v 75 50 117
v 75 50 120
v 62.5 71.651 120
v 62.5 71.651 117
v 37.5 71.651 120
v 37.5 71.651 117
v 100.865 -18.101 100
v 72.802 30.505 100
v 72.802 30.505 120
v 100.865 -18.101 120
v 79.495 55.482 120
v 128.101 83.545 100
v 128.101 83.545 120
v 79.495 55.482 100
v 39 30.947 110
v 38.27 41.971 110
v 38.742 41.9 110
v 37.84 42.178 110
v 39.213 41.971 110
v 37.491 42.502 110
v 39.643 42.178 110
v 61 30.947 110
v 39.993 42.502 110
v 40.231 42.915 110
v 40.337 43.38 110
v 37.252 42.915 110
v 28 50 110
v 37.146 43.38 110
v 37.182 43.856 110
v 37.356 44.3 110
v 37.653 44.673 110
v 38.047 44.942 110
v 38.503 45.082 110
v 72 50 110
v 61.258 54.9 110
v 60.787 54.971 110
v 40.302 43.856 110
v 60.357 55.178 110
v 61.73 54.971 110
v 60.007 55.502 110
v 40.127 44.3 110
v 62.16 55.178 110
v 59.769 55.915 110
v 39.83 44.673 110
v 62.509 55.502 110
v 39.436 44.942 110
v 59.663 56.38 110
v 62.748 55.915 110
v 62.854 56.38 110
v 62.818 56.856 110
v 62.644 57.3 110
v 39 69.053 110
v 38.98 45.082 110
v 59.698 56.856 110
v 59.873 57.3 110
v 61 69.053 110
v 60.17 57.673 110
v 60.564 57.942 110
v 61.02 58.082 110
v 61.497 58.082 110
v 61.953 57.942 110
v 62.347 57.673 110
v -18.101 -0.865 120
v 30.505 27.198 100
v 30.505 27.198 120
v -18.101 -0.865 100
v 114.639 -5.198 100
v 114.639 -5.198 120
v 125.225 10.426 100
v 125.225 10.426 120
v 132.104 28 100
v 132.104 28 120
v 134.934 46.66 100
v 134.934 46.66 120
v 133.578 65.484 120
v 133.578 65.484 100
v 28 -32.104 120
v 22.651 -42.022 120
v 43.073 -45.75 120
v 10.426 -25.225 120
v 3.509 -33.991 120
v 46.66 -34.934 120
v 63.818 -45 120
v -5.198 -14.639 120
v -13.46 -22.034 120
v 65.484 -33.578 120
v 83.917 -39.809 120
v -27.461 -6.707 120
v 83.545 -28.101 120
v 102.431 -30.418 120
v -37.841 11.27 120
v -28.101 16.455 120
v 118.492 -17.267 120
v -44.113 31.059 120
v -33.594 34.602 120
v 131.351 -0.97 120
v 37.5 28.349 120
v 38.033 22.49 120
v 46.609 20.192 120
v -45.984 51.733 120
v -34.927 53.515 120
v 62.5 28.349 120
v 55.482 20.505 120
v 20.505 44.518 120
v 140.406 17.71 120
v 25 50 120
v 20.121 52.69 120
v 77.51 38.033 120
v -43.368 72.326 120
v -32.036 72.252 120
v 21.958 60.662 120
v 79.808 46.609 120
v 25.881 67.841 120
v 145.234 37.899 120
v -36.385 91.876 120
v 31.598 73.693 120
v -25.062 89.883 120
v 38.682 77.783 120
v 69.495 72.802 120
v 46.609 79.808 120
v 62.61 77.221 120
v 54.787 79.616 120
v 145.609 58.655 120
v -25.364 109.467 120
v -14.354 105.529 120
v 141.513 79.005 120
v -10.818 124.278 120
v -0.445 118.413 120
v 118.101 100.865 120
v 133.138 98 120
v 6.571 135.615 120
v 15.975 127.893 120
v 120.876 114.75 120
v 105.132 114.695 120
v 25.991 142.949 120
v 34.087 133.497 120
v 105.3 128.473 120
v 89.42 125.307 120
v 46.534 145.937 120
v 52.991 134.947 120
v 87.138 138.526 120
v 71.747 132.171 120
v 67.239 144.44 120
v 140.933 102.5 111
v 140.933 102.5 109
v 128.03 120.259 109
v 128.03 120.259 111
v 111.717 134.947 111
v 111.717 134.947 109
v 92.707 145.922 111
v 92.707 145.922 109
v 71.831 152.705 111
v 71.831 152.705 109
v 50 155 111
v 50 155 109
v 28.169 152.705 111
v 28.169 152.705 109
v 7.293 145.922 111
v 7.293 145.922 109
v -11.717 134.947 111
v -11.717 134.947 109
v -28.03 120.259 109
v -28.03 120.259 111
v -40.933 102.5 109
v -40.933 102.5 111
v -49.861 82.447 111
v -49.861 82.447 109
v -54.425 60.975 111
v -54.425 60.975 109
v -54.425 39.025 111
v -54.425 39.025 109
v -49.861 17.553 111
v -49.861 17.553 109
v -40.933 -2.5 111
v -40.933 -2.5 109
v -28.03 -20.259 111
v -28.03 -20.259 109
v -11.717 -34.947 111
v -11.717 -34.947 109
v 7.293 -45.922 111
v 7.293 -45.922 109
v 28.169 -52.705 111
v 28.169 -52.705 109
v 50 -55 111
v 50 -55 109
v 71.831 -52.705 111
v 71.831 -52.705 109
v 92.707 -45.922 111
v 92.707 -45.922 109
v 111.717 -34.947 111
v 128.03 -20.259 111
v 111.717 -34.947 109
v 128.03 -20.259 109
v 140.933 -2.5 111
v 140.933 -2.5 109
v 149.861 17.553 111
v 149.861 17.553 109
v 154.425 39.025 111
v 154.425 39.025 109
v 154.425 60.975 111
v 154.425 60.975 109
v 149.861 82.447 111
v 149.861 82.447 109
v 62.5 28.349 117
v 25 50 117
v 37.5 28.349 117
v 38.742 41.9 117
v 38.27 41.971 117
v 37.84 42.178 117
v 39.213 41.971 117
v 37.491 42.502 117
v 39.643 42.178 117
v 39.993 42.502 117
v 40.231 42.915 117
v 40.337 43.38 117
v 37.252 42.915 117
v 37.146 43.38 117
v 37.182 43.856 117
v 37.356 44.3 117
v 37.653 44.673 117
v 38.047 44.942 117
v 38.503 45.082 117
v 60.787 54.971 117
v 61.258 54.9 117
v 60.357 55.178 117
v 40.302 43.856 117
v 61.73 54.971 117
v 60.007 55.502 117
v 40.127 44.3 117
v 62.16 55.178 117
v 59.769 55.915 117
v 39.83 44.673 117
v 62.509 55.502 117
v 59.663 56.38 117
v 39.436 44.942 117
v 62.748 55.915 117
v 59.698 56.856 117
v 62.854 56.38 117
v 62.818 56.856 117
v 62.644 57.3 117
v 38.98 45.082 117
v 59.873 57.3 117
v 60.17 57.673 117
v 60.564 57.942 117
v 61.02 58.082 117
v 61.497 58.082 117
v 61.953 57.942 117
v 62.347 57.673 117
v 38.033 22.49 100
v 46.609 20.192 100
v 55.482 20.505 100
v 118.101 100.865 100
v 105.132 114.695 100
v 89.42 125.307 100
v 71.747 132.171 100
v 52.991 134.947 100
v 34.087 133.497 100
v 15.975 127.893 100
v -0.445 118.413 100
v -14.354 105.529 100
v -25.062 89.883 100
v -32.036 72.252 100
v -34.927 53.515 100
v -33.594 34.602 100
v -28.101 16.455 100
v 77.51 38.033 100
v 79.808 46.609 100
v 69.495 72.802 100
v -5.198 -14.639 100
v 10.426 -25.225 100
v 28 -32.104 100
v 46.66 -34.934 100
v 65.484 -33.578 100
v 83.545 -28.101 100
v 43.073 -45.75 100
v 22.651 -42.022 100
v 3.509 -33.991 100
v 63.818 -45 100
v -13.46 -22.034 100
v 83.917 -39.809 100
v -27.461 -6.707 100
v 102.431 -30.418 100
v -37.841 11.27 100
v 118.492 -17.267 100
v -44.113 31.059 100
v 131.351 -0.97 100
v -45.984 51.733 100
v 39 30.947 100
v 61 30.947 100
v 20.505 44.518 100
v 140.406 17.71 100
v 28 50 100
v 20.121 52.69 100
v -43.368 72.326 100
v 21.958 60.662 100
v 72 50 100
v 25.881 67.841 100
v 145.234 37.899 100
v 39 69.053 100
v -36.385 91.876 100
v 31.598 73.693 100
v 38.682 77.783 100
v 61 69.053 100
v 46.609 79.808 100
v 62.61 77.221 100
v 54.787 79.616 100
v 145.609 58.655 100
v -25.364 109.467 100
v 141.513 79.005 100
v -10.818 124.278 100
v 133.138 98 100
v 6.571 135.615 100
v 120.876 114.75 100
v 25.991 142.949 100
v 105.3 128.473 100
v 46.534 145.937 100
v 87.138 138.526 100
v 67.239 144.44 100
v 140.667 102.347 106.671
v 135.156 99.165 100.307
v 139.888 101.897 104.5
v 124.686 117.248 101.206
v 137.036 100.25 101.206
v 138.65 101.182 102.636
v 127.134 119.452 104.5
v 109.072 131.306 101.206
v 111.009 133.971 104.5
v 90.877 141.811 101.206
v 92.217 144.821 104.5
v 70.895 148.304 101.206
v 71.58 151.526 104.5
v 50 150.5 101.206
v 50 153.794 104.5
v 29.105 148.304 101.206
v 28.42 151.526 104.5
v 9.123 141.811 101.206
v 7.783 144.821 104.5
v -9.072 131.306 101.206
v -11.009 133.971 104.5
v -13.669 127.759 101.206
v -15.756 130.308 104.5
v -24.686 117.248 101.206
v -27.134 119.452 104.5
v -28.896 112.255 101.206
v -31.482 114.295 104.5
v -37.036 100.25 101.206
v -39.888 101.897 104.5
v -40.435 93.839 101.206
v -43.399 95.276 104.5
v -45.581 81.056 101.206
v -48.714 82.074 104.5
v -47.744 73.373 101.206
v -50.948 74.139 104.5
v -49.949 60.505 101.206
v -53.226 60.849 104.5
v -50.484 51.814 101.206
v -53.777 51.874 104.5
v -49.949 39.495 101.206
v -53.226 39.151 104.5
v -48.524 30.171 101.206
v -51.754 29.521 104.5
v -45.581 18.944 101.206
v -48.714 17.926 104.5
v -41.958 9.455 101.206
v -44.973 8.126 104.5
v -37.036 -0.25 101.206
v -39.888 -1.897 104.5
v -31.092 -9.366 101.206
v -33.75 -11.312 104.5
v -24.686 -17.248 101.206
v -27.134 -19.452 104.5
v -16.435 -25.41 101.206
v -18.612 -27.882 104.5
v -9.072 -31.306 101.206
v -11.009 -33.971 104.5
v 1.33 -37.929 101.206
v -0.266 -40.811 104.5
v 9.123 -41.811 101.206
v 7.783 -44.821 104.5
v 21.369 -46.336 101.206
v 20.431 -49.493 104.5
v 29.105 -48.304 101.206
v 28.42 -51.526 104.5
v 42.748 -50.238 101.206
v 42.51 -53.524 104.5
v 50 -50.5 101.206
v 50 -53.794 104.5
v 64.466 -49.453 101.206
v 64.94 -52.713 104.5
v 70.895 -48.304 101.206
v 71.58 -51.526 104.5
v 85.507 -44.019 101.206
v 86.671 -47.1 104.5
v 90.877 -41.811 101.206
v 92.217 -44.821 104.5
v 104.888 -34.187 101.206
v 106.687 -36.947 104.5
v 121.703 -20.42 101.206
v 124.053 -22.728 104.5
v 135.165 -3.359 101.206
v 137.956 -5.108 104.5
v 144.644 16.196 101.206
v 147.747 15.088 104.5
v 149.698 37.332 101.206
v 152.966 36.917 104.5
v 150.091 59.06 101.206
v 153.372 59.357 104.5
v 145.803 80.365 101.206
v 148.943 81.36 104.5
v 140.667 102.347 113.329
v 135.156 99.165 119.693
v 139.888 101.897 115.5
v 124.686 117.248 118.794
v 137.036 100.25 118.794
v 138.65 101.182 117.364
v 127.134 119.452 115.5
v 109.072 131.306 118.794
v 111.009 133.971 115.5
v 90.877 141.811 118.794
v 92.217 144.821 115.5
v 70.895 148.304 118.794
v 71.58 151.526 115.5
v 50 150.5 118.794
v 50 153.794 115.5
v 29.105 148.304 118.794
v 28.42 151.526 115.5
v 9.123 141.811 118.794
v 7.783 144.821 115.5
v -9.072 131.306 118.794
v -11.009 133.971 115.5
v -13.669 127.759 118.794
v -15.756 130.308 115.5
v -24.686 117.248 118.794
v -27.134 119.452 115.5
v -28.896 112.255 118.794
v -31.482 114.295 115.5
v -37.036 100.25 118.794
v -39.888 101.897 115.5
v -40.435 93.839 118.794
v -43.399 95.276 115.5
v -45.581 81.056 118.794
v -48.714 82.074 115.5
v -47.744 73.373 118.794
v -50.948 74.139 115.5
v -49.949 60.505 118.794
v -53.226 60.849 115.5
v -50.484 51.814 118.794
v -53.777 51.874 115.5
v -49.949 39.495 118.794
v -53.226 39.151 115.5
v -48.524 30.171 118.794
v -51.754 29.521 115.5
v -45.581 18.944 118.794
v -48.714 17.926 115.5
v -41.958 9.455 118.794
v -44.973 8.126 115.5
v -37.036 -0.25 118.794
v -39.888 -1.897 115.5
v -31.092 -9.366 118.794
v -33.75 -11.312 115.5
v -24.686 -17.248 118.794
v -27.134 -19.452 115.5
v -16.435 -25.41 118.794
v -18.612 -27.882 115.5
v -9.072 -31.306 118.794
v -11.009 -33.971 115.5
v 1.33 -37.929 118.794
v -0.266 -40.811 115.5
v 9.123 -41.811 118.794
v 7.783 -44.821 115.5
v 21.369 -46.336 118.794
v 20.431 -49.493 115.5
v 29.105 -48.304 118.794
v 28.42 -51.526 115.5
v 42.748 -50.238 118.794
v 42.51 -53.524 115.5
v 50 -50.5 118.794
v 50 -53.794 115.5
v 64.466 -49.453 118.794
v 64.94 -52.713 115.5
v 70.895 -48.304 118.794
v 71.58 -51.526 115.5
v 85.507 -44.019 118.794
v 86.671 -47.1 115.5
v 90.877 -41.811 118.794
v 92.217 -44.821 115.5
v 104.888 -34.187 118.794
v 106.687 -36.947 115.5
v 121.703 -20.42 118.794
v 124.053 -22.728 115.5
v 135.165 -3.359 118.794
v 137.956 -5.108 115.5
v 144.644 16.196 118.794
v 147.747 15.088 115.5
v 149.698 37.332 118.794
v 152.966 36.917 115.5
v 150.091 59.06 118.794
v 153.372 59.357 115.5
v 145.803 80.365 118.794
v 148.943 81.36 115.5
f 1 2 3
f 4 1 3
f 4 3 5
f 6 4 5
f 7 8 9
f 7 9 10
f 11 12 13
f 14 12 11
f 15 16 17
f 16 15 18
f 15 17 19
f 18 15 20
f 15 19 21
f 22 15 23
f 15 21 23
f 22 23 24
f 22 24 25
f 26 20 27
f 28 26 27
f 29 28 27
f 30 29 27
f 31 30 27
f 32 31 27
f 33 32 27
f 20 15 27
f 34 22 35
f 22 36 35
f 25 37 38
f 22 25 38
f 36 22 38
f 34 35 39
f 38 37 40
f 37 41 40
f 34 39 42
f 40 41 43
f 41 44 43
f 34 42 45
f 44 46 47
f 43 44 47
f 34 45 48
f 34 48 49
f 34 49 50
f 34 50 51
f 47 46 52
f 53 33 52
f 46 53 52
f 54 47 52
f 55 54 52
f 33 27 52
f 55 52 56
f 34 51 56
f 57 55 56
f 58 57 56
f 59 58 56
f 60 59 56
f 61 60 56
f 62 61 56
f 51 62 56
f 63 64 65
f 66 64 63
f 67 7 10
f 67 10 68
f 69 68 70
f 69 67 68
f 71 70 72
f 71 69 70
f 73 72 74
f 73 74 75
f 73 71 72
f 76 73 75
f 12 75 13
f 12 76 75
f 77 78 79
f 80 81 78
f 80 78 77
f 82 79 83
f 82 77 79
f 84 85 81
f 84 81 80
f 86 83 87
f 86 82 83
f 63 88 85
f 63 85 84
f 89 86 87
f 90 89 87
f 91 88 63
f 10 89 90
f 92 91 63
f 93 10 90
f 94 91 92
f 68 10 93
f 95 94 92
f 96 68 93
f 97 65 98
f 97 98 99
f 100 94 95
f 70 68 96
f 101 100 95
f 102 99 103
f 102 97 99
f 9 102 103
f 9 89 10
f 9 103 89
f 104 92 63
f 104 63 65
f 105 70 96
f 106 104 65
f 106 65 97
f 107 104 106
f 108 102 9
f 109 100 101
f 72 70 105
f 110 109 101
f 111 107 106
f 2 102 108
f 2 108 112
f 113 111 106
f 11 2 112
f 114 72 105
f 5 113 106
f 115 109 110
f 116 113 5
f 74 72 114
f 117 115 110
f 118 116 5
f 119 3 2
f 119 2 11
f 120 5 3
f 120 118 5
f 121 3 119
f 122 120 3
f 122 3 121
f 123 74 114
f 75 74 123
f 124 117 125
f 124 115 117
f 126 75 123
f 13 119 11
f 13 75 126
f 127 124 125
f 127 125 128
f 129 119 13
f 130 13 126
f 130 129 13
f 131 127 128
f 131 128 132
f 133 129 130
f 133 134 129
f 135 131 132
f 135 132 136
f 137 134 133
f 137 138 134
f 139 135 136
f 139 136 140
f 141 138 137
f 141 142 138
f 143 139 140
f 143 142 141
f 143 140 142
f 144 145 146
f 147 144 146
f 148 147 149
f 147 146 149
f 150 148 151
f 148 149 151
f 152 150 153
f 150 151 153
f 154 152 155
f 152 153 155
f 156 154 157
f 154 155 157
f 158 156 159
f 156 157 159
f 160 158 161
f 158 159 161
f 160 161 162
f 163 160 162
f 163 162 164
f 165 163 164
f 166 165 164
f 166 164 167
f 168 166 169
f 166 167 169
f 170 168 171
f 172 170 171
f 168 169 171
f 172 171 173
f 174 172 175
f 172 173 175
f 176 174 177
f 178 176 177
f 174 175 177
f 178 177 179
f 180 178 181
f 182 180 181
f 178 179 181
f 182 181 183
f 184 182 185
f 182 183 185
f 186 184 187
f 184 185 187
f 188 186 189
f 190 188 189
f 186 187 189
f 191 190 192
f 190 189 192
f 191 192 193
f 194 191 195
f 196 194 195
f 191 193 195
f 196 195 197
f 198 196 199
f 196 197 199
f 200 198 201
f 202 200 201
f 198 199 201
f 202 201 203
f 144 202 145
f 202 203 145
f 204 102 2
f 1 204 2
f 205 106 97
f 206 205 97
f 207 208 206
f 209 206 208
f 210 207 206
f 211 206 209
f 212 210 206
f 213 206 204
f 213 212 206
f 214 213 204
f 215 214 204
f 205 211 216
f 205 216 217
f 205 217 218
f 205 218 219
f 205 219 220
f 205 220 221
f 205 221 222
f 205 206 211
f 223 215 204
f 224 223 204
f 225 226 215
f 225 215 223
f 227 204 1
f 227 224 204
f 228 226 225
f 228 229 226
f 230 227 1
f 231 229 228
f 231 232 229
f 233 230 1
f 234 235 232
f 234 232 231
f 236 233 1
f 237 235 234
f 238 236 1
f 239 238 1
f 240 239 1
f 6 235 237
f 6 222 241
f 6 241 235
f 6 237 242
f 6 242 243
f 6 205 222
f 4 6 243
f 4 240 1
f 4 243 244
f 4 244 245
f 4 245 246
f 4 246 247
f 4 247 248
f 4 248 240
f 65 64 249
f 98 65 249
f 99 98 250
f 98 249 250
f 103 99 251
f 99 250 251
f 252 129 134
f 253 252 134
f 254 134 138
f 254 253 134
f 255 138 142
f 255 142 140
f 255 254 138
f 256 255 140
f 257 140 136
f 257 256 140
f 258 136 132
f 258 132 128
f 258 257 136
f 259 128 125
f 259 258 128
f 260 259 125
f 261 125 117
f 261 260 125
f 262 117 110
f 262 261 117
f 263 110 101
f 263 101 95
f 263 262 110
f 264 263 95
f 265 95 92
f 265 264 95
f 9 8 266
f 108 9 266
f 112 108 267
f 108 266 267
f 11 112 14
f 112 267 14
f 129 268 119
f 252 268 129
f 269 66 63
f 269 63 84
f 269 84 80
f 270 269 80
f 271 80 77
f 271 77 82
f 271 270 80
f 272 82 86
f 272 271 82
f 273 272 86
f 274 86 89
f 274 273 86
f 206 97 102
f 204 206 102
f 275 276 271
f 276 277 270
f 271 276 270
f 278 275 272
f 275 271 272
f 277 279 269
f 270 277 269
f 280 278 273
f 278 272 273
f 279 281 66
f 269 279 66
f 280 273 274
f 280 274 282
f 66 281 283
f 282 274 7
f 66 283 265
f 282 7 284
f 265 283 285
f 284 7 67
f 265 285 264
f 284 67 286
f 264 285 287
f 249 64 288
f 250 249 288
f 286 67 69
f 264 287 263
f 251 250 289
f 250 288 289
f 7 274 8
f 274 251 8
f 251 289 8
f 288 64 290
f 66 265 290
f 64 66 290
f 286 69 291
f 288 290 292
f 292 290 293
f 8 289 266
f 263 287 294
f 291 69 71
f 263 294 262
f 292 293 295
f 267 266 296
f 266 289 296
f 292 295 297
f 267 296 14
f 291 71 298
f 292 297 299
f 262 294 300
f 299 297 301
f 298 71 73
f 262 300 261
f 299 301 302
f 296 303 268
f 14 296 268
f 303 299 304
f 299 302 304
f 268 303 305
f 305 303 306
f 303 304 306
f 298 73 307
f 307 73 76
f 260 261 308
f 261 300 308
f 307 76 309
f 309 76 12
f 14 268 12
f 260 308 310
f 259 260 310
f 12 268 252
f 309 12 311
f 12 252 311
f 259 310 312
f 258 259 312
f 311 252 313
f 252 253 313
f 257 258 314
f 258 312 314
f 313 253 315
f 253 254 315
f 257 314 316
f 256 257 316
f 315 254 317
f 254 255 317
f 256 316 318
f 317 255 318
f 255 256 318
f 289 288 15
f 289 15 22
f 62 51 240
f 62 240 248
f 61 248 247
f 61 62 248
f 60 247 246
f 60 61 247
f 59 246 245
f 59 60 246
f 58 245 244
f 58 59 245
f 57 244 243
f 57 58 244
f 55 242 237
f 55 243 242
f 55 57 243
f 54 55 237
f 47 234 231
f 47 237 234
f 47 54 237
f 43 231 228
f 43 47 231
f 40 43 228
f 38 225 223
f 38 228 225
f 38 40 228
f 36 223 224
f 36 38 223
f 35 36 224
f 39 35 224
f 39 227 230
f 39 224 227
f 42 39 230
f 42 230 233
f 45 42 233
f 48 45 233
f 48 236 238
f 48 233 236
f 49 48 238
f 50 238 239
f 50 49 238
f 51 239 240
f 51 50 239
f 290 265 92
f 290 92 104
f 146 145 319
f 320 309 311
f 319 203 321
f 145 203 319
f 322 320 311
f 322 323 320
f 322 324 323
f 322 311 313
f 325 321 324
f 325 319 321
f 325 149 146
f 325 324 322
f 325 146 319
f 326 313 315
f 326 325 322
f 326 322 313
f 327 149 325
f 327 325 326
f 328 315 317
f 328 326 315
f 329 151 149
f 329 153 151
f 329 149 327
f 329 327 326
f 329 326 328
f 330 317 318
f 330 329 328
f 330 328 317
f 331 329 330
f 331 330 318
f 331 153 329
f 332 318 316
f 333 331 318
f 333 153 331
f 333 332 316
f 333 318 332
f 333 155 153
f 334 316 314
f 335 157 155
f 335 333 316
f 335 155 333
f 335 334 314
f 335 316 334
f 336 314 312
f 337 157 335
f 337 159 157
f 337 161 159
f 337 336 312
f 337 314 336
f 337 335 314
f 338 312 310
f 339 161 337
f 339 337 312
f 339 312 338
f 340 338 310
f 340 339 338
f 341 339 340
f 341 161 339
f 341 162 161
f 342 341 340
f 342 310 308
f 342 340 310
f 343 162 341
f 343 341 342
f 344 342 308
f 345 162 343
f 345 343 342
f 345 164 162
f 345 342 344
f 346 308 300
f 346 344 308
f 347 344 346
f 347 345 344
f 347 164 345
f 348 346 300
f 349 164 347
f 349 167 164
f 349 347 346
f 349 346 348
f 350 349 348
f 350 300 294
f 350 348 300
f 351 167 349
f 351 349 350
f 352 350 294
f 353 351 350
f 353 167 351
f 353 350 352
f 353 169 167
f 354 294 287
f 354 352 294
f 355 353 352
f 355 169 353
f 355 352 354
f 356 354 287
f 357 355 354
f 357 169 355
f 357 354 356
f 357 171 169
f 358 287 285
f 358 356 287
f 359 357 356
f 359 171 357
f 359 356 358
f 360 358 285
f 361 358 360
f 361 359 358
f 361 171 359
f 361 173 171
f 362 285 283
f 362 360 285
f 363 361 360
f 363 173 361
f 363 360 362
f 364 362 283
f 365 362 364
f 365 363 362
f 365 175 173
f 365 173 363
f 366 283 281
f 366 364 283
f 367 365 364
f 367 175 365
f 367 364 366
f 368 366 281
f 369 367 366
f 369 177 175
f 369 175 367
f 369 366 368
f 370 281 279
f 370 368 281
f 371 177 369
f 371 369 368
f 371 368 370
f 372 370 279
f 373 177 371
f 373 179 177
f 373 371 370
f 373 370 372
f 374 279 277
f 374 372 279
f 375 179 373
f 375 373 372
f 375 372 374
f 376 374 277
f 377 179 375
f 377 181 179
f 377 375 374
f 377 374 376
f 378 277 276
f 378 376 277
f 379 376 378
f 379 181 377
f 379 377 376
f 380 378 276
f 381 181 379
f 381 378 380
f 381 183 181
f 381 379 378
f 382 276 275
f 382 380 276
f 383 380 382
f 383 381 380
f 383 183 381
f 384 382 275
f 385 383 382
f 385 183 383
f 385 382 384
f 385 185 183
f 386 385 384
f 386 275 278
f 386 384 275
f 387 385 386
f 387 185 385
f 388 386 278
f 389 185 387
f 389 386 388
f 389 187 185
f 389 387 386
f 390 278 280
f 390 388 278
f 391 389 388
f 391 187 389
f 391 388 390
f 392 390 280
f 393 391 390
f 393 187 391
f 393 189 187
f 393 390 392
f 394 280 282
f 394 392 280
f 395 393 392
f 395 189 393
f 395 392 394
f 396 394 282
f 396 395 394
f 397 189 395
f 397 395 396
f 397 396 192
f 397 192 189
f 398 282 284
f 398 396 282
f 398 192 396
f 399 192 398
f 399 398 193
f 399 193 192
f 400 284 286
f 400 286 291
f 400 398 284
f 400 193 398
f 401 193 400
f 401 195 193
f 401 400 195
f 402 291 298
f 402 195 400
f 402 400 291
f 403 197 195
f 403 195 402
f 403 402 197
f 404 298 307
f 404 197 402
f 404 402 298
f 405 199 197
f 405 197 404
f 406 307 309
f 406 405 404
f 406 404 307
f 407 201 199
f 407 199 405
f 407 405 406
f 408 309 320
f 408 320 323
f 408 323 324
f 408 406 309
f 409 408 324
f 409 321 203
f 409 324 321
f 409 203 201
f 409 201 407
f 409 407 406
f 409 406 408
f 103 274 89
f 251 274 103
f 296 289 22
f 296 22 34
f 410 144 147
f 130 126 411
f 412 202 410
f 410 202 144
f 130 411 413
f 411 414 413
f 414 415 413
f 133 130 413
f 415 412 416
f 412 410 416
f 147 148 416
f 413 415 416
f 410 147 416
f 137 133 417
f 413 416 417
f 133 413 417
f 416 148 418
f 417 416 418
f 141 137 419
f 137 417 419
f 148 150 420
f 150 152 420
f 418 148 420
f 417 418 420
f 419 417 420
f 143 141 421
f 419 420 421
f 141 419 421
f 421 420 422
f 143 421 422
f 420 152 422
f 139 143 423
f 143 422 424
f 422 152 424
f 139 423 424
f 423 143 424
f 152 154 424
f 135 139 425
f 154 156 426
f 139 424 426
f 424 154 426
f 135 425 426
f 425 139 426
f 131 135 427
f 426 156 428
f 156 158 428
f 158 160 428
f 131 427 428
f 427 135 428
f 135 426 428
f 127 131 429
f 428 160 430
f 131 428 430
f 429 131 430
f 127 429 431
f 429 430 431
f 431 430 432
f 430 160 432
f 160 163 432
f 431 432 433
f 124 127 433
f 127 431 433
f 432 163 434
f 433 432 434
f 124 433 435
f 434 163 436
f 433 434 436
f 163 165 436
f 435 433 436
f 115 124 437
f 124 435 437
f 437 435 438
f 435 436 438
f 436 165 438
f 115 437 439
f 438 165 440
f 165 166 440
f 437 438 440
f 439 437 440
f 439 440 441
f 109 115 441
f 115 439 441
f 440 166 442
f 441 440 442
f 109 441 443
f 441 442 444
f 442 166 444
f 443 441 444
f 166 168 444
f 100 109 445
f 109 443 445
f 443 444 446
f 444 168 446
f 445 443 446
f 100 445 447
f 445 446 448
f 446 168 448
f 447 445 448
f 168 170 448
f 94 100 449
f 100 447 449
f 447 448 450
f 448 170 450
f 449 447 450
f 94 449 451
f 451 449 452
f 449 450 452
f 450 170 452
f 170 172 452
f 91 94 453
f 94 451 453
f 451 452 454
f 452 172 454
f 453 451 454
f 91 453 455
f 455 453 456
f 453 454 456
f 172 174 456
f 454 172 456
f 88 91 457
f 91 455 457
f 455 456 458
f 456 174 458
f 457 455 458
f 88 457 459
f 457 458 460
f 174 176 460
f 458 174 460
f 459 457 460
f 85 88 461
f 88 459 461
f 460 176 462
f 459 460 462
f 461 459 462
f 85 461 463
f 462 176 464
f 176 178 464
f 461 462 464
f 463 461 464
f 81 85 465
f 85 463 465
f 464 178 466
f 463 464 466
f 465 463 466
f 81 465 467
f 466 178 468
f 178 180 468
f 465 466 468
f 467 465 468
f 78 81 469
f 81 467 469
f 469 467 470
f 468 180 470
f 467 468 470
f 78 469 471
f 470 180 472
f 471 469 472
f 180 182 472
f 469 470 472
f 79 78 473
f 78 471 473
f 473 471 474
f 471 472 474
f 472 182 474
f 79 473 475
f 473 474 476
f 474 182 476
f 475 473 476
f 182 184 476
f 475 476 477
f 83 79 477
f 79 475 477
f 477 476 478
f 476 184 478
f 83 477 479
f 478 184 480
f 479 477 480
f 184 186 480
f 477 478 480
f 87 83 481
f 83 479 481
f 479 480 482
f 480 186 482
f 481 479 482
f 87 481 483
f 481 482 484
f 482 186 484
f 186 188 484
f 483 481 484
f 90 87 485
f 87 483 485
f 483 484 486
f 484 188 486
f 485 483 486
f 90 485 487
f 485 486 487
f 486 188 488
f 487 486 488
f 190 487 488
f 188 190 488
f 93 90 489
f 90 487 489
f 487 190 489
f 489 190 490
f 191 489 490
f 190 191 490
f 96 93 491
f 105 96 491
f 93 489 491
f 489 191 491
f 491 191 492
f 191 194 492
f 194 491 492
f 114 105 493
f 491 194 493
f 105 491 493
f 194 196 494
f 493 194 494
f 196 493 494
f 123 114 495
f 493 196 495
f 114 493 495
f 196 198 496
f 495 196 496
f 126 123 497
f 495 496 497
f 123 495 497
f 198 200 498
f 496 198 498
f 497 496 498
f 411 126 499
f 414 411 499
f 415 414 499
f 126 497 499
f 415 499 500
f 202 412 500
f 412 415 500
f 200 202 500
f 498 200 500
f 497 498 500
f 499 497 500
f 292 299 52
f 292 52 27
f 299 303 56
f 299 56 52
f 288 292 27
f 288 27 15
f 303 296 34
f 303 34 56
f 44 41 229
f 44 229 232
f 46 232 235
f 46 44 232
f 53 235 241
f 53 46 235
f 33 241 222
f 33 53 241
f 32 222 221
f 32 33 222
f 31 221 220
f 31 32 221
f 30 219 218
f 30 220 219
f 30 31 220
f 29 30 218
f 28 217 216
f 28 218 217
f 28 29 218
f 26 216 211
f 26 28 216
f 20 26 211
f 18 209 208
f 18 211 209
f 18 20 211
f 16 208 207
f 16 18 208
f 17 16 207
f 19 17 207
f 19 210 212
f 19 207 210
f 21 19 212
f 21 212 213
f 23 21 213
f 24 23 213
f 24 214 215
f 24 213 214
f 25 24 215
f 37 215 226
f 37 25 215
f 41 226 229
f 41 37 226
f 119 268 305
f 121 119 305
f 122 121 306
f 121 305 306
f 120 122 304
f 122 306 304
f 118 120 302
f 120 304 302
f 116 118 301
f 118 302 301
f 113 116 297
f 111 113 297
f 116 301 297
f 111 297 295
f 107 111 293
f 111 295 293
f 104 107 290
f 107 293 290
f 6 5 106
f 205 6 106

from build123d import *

# Parameters (mm, degrees)
SKETCH012_R             = 105
SKETCH012_R_2           = 85
PAD006_DEPTH            = 20
PAD005_DEPTH            = 20
POCKET006_DEPTH         = 10
SKETCH013_R             = 1.6
POCKET007_DEPTH         = 20
POCKET008_DEPTH         = 3
FILLET001_R             = 9
BODY002_PLACEMENT_ANGLE = 30


with BuildPart() as part:
    # Sketch012 → Pad006 (new body)
    with BuildSketch(Plane.XY):
        Circle(SKETCH012_R)
        Circle(SKETCH012_R_2, mode=Mode.SUBTRACT)
    extrude(amount=PAD006_DEPTH)

    # Sketch014 → Pad005 (join)
    with BuildSketch(Plane.XY):
        with BuildLine():
            ThreePointArc((-28.284271, -10), (-21.213203, -21.213203), (-10, -28.284271))
            Line((-10, -100), (-10, -28.284271))
            Line((10, -100), (-10, -100))
            Line((10, -28.284271), (10, -100))
            ThreePointArc((10, -28.284271), (21.213203, -21.213203), (28.284271, -10))
            Line((100, -10), (28.284271, -10))
            Line((100, 10), (100, -10))
            Line((28.284271, 10), (100, 10))
            ThreePointArc((28.284271, 10), (0, 30), (-28.284271, 10))
            Line((-100, 10), (-28.284271, 10))
            Line((-100, -10), (-100, 10))
            Line((-28.284271, -10), (-100, -10))
        make_face()
    extrude(amount=PAD005_DEPTH)

    # Sketch011 → Pocket006 (cut)
    with BuildSketch(Plane.XY):
        Polygon((19.052559, 11), (0, 22), (-19.052559, 11), (-19.052559, -11), (0, -22), (19.052559, -11), align=None)
    extrude(amount=POCKET006_DEPTH, mode=Mode.SUBTRACT)

    # Sketch013 → Pocket007 (cut)
    with BuildSketch(Plane.XY):
        with Locations((-13, 0)):
            Circle(SKETCH013_R)
        with Locations((13, 0)):
            Circle(SKETCH013_R)
    extrude(amount=POCKET007_DEPTH, mode=Mode.SUBTRACT)

    # Sketch015 → Pocket008 (cut)
    with BuildSketch(Plane.XY.offset(20)):
        Polygon((21.650635, 12.5), (0, 25), (-21.650635, 12.5), (-21.650635, -12.5), (0, -25), (21.650635, -12.5), align=None)
    extrude(amount=-POCKET008_DEPTH, mode=Mode.SUBTRACT)

    # Fillet001
    fillet001_edges = [part.edges().sort_by_distance(p)[0] for p in [
        (-105, 0, 20),
        (-105, 0, 0),
    ]]
    fillet(fillet001_edges, radius=FILLET001_R)


with BuildPart() as part_1:
    # Body002 placement: moved
    add(part.part.moved(Location((50, 50, 100))).rotate(Axis((50, 50, 100), (0, 0, 1)), BODY002_PLACEMENT_ANGLE))


solid = part_1.part
